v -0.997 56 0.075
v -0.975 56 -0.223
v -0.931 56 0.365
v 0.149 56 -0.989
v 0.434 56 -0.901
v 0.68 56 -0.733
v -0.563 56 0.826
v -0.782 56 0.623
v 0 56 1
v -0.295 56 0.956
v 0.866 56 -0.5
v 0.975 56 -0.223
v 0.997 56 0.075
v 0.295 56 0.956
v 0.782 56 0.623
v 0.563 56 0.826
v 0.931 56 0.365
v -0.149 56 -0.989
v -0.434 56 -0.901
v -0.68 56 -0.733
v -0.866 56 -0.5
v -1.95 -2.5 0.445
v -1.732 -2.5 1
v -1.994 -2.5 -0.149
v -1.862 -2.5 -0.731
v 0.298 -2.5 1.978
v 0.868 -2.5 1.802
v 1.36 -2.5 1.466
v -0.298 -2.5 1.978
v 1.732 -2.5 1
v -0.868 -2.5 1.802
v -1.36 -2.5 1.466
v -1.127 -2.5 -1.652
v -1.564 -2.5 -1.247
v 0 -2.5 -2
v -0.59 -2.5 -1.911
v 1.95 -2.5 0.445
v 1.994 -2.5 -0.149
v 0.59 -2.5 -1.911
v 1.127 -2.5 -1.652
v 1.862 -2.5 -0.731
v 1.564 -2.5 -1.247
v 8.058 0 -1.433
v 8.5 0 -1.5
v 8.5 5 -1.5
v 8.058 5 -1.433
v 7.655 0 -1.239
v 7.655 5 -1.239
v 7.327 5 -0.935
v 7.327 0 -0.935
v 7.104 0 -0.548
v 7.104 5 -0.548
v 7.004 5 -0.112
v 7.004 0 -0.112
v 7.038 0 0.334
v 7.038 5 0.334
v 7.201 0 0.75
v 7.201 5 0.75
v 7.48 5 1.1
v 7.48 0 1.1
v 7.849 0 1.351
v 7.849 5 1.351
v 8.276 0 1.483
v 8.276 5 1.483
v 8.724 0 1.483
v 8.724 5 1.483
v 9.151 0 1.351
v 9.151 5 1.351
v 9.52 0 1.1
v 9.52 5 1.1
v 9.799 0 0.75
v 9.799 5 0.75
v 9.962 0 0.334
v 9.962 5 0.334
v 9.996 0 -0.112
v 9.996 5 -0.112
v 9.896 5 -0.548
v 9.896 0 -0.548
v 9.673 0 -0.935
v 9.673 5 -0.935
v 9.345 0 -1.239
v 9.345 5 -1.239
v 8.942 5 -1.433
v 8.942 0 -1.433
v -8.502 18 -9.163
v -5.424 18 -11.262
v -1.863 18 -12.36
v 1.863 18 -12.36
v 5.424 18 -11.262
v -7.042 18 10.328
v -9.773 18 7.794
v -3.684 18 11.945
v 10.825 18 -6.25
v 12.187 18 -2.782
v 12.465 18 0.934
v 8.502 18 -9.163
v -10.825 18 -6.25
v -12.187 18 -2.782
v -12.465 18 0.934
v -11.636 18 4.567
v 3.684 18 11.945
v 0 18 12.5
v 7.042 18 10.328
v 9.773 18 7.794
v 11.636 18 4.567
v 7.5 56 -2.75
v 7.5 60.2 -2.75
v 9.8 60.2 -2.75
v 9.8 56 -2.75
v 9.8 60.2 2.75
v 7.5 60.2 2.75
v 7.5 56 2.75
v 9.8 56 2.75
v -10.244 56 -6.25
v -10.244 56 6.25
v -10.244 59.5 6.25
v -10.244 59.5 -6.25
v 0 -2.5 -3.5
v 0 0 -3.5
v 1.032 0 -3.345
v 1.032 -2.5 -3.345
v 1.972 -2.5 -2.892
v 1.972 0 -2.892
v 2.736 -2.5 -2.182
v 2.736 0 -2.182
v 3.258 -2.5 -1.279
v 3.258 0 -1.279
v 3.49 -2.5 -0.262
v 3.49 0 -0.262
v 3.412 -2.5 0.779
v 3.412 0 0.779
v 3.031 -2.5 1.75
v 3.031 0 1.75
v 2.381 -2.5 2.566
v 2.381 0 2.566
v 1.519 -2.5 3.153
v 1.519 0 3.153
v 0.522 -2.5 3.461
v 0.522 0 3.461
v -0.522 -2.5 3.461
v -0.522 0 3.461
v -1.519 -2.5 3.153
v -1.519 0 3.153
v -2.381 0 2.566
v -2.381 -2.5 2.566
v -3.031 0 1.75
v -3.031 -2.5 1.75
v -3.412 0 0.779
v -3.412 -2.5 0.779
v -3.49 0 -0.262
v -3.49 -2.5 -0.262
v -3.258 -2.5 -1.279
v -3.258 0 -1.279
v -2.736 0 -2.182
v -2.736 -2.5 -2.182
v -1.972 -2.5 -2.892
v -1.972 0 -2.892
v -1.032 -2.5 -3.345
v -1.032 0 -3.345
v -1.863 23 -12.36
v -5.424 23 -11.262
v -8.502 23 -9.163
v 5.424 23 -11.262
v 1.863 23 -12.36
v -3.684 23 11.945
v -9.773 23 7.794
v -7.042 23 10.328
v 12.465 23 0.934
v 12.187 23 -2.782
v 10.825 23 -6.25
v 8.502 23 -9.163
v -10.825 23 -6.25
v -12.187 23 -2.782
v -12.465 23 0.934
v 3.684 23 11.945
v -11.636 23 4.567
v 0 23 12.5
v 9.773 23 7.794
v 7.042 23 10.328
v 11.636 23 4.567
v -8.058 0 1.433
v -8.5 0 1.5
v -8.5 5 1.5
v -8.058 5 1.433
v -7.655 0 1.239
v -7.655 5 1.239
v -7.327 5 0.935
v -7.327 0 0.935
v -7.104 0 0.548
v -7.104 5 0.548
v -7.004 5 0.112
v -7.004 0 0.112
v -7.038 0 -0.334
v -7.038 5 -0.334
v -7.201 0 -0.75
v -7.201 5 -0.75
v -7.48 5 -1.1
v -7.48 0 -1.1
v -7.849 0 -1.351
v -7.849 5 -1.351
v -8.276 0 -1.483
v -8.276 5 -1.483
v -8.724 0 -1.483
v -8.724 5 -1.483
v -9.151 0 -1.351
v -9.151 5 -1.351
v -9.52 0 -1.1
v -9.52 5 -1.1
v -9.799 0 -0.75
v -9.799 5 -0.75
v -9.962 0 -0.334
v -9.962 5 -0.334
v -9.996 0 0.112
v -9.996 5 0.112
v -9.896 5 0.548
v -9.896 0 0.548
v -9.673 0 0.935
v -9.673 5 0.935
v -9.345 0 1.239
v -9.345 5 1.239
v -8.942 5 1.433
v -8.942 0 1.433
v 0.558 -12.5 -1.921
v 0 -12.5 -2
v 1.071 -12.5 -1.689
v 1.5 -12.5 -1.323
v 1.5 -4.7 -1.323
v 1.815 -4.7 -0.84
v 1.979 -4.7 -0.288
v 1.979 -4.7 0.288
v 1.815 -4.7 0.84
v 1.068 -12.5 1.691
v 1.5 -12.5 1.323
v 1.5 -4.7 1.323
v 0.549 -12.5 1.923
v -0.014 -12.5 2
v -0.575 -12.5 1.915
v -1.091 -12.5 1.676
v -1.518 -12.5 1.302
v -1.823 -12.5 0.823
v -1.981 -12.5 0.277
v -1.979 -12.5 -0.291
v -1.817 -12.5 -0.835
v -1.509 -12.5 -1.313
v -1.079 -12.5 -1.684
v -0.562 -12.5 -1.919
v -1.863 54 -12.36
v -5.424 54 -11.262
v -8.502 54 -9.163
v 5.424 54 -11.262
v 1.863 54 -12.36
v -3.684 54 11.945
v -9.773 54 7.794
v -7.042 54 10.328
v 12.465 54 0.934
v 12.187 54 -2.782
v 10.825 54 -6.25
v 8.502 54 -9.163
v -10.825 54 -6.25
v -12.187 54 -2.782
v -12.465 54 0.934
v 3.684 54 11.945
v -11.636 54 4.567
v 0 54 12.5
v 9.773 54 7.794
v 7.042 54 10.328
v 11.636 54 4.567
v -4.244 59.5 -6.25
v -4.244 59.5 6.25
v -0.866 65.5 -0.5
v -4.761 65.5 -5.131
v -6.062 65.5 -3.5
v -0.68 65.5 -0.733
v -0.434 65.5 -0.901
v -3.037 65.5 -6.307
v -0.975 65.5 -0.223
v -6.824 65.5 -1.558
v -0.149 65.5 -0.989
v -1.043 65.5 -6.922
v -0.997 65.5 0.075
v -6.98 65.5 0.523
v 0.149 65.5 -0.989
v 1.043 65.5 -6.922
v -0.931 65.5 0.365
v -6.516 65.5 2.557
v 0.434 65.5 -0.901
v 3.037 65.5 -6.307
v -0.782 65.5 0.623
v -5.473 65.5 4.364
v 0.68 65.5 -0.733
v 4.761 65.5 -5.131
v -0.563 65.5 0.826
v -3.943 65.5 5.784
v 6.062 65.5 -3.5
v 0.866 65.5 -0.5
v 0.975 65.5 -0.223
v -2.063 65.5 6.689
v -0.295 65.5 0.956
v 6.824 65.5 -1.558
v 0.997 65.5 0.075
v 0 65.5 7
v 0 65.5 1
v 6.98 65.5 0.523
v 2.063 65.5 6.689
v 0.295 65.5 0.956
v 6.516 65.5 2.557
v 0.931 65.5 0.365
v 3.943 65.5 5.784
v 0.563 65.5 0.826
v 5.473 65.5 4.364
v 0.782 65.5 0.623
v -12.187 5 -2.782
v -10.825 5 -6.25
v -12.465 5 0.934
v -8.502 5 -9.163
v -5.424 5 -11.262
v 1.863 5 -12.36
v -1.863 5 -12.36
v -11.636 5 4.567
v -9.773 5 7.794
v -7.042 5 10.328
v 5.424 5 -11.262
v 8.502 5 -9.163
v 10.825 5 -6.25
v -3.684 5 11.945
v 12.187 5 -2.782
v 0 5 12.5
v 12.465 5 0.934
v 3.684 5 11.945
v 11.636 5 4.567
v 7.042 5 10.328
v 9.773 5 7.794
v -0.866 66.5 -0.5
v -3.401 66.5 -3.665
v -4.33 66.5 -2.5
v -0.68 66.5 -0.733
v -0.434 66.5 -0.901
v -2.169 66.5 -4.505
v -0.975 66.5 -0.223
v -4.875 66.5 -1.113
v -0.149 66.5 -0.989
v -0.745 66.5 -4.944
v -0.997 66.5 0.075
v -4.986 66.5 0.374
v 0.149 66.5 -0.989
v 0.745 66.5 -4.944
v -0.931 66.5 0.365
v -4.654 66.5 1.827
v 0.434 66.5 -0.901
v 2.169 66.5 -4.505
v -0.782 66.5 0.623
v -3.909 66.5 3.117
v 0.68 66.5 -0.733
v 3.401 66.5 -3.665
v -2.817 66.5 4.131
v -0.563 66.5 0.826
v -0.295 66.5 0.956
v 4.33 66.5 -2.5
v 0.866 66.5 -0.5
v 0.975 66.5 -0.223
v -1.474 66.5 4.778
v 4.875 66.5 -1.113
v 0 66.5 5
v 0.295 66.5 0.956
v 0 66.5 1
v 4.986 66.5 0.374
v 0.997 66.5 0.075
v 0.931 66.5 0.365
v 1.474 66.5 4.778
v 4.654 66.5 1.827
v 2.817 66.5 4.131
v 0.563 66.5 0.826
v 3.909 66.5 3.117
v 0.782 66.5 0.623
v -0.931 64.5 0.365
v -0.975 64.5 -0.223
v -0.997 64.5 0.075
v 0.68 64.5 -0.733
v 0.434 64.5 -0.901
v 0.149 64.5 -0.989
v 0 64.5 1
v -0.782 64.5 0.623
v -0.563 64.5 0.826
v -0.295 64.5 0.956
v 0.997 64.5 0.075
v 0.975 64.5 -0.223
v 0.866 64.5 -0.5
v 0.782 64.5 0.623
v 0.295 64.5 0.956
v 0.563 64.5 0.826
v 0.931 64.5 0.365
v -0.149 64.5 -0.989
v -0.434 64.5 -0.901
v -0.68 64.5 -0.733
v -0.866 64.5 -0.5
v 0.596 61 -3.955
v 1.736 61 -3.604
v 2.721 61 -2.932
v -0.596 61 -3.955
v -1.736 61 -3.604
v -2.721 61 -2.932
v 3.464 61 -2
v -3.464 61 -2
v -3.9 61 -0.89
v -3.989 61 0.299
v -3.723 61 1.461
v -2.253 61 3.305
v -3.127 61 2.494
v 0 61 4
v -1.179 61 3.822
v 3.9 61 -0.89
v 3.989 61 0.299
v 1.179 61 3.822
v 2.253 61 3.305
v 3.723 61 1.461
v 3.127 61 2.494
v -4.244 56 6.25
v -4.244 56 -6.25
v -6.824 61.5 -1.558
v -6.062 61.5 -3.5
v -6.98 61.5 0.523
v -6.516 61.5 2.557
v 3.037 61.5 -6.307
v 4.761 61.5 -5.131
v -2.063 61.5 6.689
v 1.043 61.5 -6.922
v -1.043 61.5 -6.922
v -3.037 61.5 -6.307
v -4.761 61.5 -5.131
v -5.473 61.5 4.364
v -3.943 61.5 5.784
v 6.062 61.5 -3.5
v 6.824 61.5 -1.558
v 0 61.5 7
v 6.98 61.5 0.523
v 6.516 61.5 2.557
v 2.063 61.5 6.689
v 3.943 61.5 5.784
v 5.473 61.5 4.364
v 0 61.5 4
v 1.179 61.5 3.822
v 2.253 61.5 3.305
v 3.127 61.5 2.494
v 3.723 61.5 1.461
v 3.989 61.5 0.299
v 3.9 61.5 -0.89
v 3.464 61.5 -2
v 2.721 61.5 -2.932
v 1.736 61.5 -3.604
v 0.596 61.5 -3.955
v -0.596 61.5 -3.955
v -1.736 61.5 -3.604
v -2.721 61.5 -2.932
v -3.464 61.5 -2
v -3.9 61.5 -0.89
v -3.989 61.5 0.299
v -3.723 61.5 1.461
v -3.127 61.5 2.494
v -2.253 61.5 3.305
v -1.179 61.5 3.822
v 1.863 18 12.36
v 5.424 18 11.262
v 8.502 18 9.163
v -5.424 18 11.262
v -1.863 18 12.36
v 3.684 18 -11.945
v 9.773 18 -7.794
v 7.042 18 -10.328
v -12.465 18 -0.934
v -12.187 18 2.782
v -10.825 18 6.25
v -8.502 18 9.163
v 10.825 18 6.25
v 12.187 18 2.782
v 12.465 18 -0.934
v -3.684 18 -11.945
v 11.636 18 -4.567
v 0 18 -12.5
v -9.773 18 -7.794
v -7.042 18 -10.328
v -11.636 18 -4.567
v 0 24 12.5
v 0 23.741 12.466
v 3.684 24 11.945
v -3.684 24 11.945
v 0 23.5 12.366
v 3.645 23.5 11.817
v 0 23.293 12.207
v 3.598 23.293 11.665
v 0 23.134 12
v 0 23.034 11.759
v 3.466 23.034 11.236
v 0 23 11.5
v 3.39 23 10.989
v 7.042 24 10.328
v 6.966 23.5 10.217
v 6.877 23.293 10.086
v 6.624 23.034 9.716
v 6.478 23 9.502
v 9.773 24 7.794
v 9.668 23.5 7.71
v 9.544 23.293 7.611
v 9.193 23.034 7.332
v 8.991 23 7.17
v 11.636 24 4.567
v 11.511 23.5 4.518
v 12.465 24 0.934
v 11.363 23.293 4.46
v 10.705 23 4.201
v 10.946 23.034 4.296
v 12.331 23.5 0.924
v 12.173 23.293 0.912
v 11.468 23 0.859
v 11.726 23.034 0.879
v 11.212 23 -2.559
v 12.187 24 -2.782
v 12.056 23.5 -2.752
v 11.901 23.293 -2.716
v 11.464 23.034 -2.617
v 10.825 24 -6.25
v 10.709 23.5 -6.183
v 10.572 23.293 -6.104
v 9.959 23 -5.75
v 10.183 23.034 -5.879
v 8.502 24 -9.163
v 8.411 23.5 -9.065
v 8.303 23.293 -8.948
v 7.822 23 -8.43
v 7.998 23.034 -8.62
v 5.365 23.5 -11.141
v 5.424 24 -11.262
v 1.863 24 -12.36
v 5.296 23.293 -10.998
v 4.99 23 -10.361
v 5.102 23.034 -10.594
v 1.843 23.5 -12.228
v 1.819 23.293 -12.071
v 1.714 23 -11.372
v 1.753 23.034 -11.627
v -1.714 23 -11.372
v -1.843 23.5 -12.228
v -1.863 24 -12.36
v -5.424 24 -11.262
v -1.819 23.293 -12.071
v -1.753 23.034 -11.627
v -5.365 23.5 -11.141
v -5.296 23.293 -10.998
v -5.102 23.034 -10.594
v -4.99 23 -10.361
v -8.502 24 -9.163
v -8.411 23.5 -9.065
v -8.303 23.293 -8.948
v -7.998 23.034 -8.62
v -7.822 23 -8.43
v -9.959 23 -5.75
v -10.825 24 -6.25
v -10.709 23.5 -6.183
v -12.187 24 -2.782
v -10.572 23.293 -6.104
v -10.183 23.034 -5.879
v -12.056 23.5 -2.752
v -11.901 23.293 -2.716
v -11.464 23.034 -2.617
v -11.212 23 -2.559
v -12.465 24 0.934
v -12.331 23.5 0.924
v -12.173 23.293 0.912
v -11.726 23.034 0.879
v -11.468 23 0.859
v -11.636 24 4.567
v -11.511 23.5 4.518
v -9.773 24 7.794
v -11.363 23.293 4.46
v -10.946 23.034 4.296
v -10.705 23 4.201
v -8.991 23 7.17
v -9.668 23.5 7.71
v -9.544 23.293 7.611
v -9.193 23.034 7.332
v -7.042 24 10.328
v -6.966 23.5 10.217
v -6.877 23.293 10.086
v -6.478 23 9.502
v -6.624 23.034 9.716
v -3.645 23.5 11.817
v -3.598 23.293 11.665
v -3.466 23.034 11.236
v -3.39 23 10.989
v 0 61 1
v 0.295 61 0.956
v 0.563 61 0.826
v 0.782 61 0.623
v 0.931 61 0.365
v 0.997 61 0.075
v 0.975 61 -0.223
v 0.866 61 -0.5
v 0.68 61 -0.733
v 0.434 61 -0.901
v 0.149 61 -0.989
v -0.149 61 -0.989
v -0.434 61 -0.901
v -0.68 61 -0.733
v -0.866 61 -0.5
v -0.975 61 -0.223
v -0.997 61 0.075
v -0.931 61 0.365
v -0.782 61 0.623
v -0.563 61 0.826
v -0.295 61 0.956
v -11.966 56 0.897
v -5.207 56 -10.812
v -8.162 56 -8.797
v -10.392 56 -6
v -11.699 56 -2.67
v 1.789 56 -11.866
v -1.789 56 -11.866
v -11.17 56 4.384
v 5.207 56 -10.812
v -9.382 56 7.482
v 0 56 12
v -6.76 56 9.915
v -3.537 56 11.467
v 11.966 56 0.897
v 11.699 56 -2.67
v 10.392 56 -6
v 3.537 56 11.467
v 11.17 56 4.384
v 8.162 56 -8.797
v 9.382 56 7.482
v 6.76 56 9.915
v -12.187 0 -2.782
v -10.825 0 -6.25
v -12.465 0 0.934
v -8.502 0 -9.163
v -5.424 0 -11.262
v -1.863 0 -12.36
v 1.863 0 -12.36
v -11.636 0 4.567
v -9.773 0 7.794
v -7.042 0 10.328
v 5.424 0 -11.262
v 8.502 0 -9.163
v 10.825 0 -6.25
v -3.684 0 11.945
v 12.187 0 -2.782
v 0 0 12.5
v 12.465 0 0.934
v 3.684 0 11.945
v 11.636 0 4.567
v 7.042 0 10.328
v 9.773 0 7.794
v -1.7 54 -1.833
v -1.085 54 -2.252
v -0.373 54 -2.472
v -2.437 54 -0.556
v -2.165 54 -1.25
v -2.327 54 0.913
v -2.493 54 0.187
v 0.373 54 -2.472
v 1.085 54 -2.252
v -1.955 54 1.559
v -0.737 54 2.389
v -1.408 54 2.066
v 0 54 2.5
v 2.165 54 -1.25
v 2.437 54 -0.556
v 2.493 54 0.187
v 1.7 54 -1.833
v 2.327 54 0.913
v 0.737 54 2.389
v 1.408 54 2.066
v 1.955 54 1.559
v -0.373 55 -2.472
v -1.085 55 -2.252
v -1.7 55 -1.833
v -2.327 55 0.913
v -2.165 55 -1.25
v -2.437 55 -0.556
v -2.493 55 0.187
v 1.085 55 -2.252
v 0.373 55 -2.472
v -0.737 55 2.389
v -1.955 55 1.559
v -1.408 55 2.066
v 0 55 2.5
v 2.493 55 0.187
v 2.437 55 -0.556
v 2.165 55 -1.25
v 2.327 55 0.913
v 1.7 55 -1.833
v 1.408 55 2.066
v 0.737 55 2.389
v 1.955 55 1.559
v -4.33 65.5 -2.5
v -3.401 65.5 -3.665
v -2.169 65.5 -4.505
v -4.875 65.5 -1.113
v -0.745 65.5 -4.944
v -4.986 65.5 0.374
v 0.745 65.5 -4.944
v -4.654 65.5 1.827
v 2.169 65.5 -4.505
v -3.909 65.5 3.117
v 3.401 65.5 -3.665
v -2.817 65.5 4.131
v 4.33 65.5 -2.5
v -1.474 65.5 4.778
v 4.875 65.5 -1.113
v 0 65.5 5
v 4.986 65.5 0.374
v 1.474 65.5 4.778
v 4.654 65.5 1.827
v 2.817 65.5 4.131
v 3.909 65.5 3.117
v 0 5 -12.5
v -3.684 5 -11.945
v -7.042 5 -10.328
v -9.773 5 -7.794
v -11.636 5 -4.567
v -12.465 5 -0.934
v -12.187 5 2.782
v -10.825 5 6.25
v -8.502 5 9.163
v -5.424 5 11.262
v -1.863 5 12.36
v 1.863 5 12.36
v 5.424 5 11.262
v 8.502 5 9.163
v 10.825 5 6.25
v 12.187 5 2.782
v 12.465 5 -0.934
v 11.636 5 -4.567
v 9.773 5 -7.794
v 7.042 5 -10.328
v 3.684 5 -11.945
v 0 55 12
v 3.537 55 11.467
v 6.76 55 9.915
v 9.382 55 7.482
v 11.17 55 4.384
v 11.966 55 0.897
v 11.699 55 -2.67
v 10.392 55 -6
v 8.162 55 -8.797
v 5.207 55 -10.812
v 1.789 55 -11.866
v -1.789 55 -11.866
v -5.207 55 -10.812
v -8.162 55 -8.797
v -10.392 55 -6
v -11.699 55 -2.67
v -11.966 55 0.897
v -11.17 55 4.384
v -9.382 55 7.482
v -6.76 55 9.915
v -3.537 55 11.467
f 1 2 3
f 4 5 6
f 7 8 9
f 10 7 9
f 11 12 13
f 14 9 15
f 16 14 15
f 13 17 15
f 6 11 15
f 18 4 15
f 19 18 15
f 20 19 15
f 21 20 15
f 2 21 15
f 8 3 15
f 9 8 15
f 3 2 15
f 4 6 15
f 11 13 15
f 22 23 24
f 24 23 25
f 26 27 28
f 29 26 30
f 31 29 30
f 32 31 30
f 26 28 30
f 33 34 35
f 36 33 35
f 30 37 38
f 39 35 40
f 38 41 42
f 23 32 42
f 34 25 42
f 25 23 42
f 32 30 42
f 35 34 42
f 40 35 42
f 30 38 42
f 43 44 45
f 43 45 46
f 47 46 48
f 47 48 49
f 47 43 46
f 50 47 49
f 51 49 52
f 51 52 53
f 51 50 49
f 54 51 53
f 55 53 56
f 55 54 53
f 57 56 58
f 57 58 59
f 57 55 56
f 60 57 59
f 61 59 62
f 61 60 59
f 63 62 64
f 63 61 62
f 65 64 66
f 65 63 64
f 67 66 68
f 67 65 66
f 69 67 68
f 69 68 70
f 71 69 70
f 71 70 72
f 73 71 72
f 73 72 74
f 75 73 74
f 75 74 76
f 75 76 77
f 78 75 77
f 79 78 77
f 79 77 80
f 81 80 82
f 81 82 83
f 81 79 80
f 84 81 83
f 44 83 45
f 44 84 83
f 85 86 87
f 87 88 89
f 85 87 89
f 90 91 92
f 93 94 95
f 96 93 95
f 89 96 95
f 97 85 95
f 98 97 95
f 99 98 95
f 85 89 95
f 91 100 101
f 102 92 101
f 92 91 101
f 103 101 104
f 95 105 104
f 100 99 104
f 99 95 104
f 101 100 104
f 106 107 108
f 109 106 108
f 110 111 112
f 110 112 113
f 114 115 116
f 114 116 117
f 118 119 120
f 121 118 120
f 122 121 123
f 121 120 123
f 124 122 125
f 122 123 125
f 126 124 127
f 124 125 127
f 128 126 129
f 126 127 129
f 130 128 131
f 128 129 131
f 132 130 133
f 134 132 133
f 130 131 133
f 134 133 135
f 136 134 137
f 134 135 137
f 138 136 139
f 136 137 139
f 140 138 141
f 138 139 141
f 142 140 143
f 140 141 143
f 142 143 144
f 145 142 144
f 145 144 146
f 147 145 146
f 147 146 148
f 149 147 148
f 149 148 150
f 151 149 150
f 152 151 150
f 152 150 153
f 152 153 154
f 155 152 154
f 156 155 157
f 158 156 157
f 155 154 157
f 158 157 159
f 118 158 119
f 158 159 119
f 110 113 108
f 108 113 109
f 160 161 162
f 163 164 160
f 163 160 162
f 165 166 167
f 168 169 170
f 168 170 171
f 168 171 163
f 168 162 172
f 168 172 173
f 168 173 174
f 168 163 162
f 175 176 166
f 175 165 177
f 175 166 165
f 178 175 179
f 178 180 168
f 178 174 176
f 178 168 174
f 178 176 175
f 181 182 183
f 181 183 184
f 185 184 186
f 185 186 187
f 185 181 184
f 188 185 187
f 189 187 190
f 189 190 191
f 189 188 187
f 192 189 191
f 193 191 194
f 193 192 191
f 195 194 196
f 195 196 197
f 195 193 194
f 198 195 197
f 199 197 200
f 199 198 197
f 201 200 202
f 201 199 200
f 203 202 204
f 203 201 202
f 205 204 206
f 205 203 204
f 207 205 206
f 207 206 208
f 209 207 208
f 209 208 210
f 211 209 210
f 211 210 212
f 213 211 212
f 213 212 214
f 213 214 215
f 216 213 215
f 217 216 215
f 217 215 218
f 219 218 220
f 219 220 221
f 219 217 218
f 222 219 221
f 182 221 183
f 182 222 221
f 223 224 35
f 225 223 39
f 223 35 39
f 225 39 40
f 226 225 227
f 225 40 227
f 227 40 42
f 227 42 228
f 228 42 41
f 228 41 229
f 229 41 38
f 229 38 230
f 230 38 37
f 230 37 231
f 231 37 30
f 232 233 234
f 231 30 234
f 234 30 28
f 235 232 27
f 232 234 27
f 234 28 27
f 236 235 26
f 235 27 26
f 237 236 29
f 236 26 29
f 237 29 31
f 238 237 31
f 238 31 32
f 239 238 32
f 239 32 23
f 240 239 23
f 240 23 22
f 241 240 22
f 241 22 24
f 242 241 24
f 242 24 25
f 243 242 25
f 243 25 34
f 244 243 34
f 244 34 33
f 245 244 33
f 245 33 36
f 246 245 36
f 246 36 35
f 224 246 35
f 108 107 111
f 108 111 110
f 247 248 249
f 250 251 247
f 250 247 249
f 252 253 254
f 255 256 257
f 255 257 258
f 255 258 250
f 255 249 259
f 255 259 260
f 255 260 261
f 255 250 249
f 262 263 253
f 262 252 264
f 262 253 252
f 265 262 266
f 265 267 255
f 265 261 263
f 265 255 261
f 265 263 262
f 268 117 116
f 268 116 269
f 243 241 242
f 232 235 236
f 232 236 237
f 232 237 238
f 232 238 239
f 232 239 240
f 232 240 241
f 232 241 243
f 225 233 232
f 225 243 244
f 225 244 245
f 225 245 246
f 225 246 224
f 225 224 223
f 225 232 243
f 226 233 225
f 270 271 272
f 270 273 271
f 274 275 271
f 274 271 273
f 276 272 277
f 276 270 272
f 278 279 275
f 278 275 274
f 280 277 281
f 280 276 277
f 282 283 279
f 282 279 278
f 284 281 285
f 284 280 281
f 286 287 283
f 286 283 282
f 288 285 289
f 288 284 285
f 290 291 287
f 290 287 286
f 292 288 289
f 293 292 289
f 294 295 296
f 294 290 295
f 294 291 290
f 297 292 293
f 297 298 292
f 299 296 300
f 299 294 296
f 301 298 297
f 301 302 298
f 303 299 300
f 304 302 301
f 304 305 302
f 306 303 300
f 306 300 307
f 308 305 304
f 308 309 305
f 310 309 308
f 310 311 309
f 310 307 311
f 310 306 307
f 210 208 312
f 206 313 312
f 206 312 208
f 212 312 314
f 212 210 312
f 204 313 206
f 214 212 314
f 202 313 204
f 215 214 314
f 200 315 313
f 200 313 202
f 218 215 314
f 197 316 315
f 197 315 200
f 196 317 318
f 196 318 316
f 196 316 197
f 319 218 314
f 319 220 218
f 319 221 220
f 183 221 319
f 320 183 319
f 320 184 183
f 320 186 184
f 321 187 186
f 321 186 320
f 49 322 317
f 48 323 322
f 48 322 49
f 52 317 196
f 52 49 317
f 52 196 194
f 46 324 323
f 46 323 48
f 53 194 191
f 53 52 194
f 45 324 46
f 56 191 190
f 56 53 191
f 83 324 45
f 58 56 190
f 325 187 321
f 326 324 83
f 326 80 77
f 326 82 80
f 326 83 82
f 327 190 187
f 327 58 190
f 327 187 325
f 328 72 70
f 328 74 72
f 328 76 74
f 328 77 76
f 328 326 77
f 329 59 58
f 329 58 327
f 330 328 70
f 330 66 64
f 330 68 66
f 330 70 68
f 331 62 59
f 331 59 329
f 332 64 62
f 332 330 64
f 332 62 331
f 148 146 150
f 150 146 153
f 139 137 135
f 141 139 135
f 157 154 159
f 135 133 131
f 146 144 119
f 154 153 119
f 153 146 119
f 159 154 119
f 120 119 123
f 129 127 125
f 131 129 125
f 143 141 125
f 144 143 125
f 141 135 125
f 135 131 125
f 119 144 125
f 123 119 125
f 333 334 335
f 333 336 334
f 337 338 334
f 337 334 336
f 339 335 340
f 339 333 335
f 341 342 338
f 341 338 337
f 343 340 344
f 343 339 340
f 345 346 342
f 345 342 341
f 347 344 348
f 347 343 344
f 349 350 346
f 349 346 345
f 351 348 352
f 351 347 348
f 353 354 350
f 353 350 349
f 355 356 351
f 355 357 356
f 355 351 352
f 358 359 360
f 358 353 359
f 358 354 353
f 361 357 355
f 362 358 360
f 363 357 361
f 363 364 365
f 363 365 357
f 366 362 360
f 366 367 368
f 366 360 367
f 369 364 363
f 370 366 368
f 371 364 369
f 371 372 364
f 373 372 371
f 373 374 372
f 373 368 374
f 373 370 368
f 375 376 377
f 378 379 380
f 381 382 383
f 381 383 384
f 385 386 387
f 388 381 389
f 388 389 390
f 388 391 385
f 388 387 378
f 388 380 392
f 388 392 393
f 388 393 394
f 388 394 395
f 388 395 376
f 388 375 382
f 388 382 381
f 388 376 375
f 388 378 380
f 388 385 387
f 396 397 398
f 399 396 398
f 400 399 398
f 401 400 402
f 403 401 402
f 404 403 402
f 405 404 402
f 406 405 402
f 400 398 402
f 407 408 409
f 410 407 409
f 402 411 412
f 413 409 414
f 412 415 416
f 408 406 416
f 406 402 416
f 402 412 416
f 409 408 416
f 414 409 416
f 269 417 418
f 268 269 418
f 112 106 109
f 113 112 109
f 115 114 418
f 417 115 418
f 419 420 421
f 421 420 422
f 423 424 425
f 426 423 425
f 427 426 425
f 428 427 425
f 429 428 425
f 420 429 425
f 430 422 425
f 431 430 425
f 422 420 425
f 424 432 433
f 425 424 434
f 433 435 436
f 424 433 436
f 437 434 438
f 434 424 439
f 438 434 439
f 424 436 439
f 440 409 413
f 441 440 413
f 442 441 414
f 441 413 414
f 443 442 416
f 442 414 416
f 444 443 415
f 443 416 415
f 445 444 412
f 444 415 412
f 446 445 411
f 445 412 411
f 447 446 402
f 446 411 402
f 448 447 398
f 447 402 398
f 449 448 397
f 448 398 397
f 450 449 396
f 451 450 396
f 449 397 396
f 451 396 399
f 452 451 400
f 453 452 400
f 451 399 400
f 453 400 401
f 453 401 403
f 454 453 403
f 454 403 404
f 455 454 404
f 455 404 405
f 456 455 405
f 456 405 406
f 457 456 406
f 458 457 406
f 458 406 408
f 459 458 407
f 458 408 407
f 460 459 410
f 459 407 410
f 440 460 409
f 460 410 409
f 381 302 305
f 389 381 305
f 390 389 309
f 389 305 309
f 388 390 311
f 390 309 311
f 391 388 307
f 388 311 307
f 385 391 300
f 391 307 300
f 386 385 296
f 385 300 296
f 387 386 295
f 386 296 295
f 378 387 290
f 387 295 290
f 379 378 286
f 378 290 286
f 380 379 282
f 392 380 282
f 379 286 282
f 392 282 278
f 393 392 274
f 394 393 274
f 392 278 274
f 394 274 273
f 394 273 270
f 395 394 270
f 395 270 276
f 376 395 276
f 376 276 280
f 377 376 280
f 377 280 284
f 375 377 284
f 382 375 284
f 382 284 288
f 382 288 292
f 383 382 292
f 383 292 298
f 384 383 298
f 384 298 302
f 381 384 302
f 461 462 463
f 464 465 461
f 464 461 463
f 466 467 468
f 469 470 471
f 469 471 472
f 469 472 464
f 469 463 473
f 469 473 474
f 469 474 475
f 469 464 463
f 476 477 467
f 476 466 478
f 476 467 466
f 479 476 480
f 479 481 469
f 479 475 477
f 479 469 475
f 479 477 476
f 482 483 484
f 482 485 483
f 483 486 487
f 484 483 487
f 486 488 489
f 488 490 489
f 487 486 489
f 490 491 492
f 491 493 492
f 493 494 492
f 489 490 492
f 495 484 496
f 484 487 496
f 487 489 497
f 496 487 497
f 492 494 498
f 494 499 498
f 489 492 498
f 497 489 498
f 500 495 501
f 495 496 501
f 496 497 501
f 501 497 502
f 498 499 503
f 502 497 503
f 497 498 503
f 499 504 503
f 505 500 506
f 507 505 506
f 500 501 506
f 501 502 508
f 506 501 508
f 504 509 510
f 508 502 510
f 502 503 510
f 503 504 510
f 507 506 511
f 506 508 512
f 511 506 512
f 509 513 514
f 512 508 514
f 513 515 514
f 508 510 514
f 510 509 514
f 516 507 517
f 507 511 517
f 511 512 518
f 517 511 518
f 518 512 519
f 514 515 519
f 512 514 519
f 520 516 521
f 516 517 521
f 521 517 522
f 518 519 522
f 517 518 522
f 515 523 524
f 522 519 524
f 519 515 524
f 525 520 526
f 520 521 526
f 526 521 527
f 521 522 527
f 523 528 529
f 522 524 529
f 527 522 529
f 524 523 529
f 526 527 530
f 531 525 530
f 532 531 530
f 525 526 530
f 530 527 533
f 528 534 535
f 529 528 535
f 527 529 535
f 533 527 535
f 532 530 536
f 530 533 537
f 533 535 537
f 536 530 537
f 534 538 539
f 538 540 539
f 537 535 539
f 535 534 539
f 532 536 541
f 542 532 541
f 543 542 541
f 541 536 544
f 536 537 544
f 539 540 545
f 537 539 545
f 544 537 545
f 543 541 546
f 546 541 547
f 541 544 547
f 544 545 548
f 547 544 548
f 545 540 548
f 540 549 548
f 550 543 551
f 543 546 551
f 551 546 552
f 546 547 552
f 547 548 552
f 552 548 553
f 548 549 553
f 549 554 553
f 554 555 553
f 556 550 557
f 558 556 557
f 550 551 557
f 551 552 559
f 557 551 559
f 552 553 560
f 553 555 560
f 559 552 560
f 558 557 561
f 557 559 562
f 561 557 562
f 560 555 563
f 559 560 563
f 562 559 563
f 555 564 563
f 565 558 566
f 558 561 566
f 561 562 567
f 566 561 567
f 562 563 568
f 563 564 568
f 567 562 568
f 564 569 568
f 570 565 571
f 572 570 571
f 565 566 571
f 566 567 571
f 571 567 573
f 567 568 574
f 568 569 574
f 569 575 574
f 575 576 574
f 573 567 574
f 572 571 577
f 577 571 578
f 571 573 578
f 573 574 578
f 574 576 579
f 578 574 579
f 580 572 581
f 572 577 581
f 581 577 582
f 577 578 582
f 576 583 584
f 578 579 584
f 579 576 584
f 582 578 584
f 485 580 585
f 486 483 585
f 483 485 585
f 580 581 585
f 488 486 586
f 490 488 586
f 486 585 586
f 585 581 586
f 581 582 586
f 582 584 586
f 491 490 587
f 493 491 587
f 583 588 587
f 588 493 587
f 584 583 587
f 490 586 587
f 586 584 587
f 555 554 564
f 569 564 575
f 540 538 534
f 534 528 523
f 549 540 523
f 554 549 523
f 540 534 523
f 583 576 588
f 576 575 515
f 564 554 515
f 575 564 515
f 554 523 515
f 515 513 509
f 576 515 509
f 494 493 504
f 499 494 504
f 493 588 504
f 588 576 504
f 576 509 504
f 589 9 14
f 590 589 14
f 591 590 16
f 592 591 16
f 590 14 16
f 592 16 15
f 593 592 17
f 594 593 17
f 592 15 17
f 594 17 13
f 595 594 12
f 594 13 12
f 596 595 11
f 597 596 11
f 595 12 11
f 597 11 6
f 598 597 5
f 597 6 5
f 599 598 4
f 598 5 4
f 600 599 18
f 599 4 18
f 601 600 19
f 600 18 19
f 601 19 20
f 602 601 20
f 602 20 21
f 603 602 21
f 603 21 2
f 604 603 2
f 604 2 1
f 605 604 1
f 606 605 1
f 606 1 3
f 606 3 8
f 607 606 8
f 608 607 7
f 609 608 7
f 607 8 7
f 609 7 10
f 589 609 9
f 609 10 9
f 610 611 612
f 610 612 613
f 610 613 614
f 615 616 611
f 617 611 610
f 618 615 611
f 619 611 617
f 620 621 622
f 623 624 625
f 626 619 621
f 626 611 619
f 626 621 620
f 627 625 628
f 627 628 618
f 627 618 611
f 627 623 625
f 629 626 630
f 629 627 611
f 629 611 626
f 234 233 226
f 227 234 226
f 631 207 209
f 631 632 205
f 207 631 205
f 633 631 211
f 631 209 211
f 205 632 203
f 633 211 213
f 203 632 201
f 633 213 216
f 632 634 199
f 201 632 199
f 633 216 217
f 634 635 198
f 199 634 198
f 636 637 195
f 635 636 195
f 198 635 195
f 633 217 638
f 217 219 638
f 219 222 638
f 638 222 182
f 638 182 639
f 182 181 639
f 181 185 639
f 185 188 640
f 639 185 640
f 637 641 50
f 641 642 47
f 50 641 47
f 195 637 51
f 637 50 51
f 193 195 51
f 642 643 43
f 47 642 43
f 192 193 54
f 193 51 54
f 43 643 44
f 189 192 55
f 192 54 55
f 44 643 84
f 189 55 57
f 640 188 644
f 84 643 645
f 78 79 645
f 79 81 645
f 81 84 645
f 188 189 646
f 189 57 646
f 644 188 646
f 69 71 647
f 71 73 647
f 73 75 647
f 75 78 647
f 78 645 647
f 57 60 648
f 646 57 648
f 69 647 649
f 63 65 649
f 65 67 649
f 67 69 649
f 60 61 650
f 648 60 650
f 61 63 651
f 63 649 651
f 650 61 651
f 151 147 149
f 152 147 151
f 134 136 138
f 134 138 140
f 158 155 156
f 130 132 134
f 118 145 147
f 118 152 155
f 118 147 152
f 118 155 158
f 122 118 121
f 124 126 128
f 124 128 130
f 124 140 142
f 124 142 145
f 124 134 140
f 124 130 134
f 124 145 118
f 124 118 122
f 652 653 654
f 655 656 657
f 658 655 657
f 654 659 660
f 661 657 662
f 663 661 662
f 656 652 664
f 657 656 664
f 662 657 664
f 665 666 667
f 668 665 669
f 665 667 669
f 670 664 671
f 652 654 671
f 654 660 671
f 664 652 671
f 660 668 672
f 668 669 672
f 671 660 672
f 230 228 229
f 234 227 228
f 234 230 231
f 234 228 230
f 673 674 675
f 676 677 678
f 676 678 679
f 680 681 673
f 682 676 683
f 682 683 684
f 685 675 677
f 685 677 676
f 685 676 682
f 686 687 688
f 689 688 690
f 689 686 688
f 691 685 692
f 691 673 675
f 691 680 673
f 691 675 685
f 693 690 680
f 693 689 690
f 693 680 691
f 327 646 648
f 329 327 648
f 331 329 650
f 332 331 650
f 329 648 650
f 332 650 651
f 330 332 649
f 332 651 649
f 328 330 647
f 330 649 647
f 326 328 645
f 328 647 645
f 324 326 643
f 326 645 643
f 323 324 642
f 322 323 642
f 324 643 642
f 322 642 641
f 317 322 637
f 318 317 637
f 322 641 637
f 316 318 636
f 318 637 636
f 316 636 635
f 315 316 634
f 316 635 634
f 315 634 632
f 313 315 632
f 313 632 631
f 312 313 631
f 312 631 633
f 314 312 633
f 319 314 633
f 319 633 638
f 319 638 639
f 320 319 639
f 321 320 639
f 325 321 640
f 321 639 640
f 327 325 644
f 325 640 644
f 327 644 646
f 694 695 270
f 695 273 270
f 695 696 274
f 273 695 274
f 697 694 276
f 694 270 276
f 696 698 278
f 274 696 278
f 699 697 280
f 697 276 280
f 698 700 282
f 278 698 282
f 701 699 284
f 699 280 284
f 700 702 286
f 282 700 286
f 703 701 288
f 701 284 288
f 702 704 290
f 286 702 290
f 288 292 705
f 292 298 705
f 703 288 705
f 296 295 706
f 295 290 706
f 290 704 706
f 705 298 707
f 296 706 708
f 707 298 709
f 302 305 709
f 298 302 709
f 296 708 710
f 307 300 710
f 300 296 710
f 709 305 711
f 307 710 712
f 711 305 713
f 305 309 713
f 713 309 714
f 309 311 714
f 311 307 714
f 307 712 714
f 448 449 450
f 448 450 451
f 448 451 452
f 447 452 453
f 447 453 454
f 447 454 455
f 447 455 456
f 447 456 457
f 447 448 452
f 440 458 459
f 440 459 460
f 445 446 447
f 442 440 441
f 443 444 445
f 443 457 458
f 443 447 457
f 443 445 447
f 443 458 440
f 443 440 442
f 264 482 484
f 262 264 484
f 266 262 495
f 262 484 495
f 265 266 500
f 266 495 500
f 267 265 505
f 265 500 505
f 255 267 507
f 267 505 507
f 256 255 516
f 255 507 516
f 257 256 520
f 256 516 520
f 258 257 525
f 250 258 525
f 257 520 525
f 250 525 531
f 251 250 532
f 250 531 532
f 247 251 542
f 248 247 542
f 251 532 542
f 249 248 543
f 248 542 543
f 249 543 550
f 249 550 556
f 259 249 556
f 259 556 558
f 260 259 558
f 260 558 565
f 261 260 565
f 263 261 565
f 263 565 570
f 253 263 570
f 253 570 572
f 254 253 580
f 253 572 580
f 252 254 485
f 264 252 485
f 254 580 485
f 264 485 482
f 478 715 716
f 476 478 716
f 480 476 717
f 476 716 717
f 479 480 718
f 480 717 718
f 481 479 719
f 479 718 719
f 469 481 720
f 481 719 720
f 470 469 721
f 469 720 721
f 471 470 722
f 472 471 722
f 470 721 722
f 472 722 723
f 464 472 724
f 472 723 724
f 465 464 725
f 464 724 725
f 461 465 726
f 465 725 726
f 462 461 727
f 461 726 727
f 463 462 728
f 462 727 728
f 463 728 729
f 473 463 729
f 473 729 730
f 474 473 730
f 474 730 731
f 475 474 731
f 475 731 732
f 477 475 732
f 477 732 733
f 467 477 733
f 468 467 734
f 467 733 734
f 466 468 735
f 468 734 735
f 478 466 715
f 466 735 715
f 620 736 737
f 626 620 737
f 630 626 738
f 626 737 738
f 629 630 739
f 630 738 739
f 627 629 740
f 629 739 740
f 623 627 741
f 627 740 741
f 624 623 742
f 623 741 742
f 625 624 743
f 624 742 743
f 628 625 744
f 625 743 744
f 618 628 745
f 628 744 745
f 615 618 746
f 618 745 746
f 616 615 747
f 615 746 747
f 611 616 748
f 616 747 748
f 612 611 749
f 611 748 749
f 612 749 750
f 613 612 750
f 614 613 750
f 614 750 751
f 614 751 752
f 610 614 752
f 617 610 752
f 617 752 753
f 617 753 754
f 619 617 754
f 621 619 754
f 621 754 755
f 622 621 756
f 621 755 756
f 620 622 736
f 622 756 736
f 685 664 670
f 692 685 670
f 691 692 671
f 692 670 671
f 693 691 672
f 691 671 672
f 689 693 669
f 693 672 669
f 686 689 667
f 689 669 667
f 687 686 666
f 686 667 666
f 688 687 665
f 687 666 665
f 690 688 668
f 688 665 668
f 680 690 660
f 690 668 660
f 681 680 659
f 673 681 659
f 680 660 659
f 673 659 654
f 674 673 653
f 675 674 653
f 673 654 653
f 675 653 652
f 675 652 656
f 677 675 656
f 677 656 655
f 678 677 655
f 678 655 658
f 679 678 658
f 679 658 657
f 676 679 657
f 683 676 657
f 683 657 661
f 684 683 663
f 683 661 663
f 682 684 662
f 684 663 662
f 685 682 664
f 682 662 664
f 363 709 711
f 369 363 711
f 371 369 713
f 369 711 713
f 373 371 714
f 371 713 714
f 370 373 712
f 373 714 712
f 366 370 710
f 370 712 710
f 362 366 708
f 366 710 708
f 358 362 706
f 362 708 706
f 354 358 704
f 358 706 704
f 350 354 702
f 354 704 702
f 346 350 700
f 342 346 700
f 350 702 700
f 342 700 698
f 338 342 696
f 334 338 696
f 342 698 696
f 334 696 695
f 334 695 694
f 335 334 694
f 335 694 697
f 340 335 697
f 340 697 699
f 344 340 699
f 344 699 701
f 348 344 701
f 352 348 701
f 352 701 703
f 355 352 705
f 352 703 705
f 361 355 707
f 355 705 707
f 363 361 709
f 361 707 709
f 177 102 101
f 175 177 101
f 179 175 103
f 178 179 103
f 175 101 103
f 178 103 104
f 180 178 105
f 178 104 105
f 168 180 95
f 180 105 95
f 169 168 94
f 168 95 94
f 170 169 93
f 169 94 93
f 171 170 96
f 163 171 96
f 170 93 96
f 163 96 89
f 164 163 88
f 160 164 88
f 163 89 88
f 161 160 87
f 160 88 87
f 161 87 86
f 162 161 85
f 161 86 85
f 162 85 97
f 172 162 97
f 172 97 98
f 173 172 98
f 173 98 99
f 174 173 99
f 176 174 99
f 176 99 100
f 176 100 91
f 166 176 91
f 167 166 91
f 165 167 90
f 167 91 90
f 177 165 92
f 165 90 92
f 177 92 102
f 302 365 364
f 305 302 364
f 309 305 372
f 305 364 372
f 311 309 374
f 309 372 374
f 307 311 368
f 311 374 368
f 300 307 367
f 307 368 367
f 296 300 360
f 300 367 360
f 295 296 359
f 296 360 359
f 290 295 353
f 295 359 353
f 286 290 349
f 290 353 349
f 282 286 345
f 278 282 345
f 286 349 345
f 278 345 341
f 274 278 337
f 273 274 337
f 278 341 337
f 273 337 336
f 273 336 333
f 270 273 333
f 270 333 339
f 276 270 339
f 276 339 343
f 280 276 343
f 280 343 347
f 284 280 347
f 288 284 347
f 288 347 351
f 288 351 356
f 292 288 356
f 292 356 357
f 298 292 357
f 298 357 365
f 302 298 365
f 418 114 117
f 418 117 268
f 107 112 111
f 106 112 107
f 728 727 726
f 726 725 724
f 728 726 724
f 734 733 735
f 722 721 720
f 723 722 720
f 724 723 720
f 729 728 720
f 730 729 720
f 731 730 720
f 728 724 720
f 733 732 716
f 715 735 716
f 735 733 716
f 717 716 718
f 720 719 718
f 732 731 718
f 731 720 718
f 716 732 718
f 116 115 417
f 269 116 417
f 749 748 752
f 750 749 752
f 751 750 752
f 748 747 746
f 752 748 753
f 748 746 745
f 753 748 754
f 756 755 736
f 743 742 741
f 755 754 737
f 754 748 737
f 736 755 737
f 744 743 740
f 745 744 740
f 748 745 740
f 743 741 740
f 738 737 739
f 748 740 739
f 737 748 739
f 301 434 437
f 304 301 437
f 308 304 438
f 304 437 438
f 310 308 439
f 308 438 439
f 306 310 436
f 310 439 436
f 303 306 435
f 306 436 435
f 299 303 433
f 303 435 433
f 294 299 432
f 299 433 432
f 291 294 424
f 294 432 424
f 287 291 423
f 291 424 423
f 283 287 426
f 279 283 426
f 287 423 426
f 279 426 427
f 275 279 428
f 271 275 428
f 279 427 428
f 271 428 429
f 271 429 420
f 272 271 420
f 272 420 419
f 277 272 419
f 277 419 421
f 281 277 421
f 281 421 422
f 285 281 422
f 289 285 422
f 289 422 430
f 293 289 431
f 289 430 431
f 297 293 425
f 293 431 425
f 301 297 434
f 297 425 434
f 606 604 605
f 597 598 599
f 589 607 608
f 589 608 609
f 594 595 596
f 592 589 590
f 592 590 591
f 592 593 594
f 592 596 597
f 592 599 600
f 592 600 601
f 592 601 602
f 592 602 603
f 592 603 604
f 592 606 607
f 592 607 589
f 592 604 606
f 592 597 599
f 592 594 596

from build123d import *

# Parameters (mm, degrees)
SKETCH1_R            = 12.5
SKETCH1_R_2          = 1.5
BOSS_EXTRUDE1_DEPTH  = 5
SKETCH2_R            = 12.5
BOSS_EXTRUDE2_DEPTH  = 13
SKETCH3_R            = 12.5
BOSS_EXTRUDE3_DEPTH  = 5
SKETCH4_R            = 12.5
BOSS_EXTRUDE4_DEPTH  = 31
FILLET2_R            = 1
SKETCH5_R            = 2.5
BOSS_EXTRUDE5_DEPTH  = 1
SKETCH6_R            = 12
BOSS_EXTRUDE6_DEPTH  = 1
SKETCH7_R            = 1
BOSS_EXTRUDE7_DEPTH  = 5
SKETCH8_R            = 4
BOSS_EXTRUDE8_DEPTH  = 0.5
SKETCH9_R            = 7
BOSS_EXTRUDE9_DEPTH  = 4
SKETCH10_R           = 5
BOSS_EXTRUDE10_DEPTH = 1
SKETCH11_R           = 1
CUT_EXTRUDE1_DEPTH   = 2
SKETCH12_R           = 3.5
BOSS_EXTRUDE11_DEPTH = 2.5
SKETCH13_R           = 2
BOSS_EXTRUDE12_DEPTH = 10
CUT_EXTRUDE2_DEPTH   = 7.8
SKETCH15_W           = 6
SKETCH15_H           = 12.5
BOSS_EXTRUDE13_DEPTH = 3.5
SKETCH16_W           = 2.3
SKETCH16_H           = 5.5
BOSS_EXTRUDE14_DEPTH = 4.2


with BuildPart() as part:
    # Sketch1 → Boss-Extrude1 (new body)
    with BuildSketch(Plane(origin=(0, 0, 0), x_dir=(1, 0, 0), z_dir=(0, 1, 0))):
        with Locations(Location((0, 0, 0), (0, 0, 270))):
            Circle(SKETCH1_R)
        with Locations(Location((-8.5, 0, 0), (0, 0, 270))):
            Circle(SKETCH1_R_2, mode=Mode.SUBTRACT)
        with Locations(Location((8.5, 0, 0), (0, 0, 90))):
            Circle(SKETCH1_R_2, mode=Mode.SUBTRACT)
    extrude(amount=BOSS_EXTRUDE1_DEPTH)


with BuildPart() as body_2:
    # Sketch2 → Boss-Extrude2 (new body)
    with BuildSketch(Plane(origin=(0, 5, 0), x_dir=(1, 0, 0), z_dir=(0, 1, 0))):
        with Locations(Location((0, 0, 0), (0, 0, 90))):
            Circle(SKETCH2_R)
    extrude(amount=BOSS_EXTRUDE2_DEPTH)


with BuildPart() as body_3:
    # Sketch3 → Boss-Extrude3 (new body)
    with BuildSketch(Plane(origin=(0, 18, 0), x_dir=(1, 0, 0), z_dir=(0, 1, 0))):
        with Locations(Location((0, 0, 0), (0, 0, 270))):
            Circle(SKETCH3_R)
    extrude(amount=BOSS_EXTRUDE3_DEPTH)


with BuildPart() as body_4:
    # Sketch4 → Boss-Extrude4 (new body)
    with BuildSketch(Plane(origin=(0, 23, 0), x_dir=(1, 0, 0), z_dir=(0, 1, 0))):
        with Locations(Location((0, 0, 0), (0, 0, 270))):
            Circle(SKETCH4_R)
    extrude(amount=BOSS_EXTRUDE4_DEPTH)

    # Fillet2
    fillet2_edges = [body_4.edges().sort_by_distance(p)[0] for p in [
        (0, 23, -12.5),
    ]]
    fillet(fillet2_edges, radius=FILLET2_R)


with BuildPart() as body_5:
    # Sketch5 → Boss-Extrude5 (new body)
    with BuildSketch(Plane(origin=(0, 54, 0), x_dir=(1, 0, 0), z_dir=(0, 1, 0))):
        with Locations(Location((0, 0, 0), (0, 0, 270))):
            Circle(SKETCH5_R)
    extrude(amount=BOSS_EXTRUDE5_DEPTH)


with BuildPart() as body_6:
    # Sketch6 → Boss-Extrude6 (new body)
    with BuildSketch(Plane(origin=(0, 55, 0), x_dir=(1, 0, 0), z_dir=(0, 1, 0))):
        with Locations(Location((0, 0, 0), (0, 0, 270))):
            Circle(SKETCH6_R)
    extrude(amount=BOSS_EXTRUDE6_DEPTH)


with BuildPart() as body_7:
    # Sketch7 → Boss-Extrude7 (new body)
    with BuildSketch(Plane(origin=(0, 56, 0), x_dir=(1, 0, 0), z_dir=(0, 1, 0))):
        with Locations(Location((0, 0, 0), (0, 0, 270))):
            Circle(SKETCH7_R)
    extrude(amount=BOSS_EXTRUDE7_DEPTH)


with BuildPart() as body_8:
    # Sketch8 → Boss-Extrude8 (new body)
    with BuildSketch(Plane(origin=(0, 61, 0), x_dir=(1, 0, 0), z_dir=(0, 1, 0))):
        with Locations(Location((0, 0, 0), (0, 0, 270))):
            Circle(SKETCH8_R)
    extrude(amount=BOSS_EXTRUDE8_DEPTH)


with BuildPart() as body_9:
    # Sketch9 → Boss-Extrude9 (new body)
    with BuildSketch(Plane(origin=(0, 61.5, 0), x_dir=(1, 0, 0), z_dir=(0, 1, 0))):
        with Locations(Location((0, 0, 0), (0, 0, 270))):
            Circle(SKETCH9_R)
    extrude(amount=BOSS_EXTRUDE9_DEPTH)


with BuildPart() as body_10:
    # Sketch10 → Boss-Extrude10 (new body)
    with BuildSketch(Plane(origin=(0, 65.5, 0), x_dir=(1, 0, 0), z_dir=(0, 1, 0))):
        with Locations(Location((0, 0, 0), (0, 0, 270))):
            Circle(SKETCH10_R)
    extrude(amount=BOSS_EXTRUDE10_DEPTH)


with BuildPart() as cut_extrude1_tool:
    # Sketch11 → Cut-Extrude1 (new body)
    with BuildSketch(Plane(origin=(0, 66.5, 0), x_dir=(1, 0, 0), z_dir=(0, 1, 0))):
        with Locations(Location((0, 0, 0), (0, 0, 270))):
            Circle(SKETCH11_R)
    extrude(amount=-CUT_EXTRUDE1_DEPTH)


with BuildPart() as body_9_1:
    add(body_9.part)

    # Cut-Extrude1: cut by cut_extrude1_tool
    add(cut_extrude1_tool.part, mode=Mode.SUBTRACT)


with BuildPart() as body_10_1:
    add(body_10.part)

    # Cut-Extrude1: cut by cut_extrude1_tool
    add(cut_extrude1_tool.part, mode=Mode.SUBTRACT)


with BuildPart() as body_11:
    # Sketch12 → Boss-Extrude11 (new body)
    with BuildSketch(Plane.XZ):
        with Locations(Location((0, 0, 0), (0, 0, 270))):
            Circle(SKETCH12_R)
    extrude(amount=BOSS_EXTRUDE11_DEPTH)


with BuildPart() as body_12:
    # Sketch13 → Boss-Extrude12 (new body)
    with BuildSketch(Plane.XZ.offset(2.5)):
        with Locations(Location((0, 0, 0), (0, 0, 270))):
            Circle(SKETCH13_R)
    extrude(amount=BOSS_EXTRUDE12_DEPTH)

    # Sketch14 → Cut-Extrude2 (cut)
    with BuildSketch(Plane.XZ.offset(12.5)):
        with BuildLine():
            Line((1.5, 1.322875656), (1.5, -1.322875656))
            ThreePointArc((1.5, -1.322875656), (2, 0), (1.5, 1.322875656))
        make_face()
    extrude(amount=-CUT_EXTRUDE2_DEPTH, mode=Mode.SUBTRACT)


with BuildPart() as body_13:
    # Sketch15 → Boss-Extrude13 (new body)
    with BuildSketch(Plane(origin=(0, 56, 0), x_dir=(1, 0, 0), z_dir=(0, 1, 0))):
        with Locations((-7.243900624, 0)):
            Rectangle(SKETCH15_W, SKETCH15_H)
    extrude(amount=BOSS_EXTRUDE13_DEPTH)


with BuildPart() as body_14:
    # Sketch16 → Boss-Extrude14 (new body)
    with BuildSketch(Plane(origin=(0, 56, 0), x_dir=(1, 0, 0), z_dir=(0, 1, 0))):
        with Locations((8.65, 0)):
            Rectangle(SKETCH16_W, SKETCH16_H)
    extrude(amount=BOSS_EXTRUDE14_DEPTH)


solid = Compound([part.part, body_2.part, body_3.part, body_4.part, body_5.part, body_6.part, body_7.part, body_8.part, body_9_1.part, body_10_1.part, body_11.part, body_12.part, body_13.part, body_14.part])
